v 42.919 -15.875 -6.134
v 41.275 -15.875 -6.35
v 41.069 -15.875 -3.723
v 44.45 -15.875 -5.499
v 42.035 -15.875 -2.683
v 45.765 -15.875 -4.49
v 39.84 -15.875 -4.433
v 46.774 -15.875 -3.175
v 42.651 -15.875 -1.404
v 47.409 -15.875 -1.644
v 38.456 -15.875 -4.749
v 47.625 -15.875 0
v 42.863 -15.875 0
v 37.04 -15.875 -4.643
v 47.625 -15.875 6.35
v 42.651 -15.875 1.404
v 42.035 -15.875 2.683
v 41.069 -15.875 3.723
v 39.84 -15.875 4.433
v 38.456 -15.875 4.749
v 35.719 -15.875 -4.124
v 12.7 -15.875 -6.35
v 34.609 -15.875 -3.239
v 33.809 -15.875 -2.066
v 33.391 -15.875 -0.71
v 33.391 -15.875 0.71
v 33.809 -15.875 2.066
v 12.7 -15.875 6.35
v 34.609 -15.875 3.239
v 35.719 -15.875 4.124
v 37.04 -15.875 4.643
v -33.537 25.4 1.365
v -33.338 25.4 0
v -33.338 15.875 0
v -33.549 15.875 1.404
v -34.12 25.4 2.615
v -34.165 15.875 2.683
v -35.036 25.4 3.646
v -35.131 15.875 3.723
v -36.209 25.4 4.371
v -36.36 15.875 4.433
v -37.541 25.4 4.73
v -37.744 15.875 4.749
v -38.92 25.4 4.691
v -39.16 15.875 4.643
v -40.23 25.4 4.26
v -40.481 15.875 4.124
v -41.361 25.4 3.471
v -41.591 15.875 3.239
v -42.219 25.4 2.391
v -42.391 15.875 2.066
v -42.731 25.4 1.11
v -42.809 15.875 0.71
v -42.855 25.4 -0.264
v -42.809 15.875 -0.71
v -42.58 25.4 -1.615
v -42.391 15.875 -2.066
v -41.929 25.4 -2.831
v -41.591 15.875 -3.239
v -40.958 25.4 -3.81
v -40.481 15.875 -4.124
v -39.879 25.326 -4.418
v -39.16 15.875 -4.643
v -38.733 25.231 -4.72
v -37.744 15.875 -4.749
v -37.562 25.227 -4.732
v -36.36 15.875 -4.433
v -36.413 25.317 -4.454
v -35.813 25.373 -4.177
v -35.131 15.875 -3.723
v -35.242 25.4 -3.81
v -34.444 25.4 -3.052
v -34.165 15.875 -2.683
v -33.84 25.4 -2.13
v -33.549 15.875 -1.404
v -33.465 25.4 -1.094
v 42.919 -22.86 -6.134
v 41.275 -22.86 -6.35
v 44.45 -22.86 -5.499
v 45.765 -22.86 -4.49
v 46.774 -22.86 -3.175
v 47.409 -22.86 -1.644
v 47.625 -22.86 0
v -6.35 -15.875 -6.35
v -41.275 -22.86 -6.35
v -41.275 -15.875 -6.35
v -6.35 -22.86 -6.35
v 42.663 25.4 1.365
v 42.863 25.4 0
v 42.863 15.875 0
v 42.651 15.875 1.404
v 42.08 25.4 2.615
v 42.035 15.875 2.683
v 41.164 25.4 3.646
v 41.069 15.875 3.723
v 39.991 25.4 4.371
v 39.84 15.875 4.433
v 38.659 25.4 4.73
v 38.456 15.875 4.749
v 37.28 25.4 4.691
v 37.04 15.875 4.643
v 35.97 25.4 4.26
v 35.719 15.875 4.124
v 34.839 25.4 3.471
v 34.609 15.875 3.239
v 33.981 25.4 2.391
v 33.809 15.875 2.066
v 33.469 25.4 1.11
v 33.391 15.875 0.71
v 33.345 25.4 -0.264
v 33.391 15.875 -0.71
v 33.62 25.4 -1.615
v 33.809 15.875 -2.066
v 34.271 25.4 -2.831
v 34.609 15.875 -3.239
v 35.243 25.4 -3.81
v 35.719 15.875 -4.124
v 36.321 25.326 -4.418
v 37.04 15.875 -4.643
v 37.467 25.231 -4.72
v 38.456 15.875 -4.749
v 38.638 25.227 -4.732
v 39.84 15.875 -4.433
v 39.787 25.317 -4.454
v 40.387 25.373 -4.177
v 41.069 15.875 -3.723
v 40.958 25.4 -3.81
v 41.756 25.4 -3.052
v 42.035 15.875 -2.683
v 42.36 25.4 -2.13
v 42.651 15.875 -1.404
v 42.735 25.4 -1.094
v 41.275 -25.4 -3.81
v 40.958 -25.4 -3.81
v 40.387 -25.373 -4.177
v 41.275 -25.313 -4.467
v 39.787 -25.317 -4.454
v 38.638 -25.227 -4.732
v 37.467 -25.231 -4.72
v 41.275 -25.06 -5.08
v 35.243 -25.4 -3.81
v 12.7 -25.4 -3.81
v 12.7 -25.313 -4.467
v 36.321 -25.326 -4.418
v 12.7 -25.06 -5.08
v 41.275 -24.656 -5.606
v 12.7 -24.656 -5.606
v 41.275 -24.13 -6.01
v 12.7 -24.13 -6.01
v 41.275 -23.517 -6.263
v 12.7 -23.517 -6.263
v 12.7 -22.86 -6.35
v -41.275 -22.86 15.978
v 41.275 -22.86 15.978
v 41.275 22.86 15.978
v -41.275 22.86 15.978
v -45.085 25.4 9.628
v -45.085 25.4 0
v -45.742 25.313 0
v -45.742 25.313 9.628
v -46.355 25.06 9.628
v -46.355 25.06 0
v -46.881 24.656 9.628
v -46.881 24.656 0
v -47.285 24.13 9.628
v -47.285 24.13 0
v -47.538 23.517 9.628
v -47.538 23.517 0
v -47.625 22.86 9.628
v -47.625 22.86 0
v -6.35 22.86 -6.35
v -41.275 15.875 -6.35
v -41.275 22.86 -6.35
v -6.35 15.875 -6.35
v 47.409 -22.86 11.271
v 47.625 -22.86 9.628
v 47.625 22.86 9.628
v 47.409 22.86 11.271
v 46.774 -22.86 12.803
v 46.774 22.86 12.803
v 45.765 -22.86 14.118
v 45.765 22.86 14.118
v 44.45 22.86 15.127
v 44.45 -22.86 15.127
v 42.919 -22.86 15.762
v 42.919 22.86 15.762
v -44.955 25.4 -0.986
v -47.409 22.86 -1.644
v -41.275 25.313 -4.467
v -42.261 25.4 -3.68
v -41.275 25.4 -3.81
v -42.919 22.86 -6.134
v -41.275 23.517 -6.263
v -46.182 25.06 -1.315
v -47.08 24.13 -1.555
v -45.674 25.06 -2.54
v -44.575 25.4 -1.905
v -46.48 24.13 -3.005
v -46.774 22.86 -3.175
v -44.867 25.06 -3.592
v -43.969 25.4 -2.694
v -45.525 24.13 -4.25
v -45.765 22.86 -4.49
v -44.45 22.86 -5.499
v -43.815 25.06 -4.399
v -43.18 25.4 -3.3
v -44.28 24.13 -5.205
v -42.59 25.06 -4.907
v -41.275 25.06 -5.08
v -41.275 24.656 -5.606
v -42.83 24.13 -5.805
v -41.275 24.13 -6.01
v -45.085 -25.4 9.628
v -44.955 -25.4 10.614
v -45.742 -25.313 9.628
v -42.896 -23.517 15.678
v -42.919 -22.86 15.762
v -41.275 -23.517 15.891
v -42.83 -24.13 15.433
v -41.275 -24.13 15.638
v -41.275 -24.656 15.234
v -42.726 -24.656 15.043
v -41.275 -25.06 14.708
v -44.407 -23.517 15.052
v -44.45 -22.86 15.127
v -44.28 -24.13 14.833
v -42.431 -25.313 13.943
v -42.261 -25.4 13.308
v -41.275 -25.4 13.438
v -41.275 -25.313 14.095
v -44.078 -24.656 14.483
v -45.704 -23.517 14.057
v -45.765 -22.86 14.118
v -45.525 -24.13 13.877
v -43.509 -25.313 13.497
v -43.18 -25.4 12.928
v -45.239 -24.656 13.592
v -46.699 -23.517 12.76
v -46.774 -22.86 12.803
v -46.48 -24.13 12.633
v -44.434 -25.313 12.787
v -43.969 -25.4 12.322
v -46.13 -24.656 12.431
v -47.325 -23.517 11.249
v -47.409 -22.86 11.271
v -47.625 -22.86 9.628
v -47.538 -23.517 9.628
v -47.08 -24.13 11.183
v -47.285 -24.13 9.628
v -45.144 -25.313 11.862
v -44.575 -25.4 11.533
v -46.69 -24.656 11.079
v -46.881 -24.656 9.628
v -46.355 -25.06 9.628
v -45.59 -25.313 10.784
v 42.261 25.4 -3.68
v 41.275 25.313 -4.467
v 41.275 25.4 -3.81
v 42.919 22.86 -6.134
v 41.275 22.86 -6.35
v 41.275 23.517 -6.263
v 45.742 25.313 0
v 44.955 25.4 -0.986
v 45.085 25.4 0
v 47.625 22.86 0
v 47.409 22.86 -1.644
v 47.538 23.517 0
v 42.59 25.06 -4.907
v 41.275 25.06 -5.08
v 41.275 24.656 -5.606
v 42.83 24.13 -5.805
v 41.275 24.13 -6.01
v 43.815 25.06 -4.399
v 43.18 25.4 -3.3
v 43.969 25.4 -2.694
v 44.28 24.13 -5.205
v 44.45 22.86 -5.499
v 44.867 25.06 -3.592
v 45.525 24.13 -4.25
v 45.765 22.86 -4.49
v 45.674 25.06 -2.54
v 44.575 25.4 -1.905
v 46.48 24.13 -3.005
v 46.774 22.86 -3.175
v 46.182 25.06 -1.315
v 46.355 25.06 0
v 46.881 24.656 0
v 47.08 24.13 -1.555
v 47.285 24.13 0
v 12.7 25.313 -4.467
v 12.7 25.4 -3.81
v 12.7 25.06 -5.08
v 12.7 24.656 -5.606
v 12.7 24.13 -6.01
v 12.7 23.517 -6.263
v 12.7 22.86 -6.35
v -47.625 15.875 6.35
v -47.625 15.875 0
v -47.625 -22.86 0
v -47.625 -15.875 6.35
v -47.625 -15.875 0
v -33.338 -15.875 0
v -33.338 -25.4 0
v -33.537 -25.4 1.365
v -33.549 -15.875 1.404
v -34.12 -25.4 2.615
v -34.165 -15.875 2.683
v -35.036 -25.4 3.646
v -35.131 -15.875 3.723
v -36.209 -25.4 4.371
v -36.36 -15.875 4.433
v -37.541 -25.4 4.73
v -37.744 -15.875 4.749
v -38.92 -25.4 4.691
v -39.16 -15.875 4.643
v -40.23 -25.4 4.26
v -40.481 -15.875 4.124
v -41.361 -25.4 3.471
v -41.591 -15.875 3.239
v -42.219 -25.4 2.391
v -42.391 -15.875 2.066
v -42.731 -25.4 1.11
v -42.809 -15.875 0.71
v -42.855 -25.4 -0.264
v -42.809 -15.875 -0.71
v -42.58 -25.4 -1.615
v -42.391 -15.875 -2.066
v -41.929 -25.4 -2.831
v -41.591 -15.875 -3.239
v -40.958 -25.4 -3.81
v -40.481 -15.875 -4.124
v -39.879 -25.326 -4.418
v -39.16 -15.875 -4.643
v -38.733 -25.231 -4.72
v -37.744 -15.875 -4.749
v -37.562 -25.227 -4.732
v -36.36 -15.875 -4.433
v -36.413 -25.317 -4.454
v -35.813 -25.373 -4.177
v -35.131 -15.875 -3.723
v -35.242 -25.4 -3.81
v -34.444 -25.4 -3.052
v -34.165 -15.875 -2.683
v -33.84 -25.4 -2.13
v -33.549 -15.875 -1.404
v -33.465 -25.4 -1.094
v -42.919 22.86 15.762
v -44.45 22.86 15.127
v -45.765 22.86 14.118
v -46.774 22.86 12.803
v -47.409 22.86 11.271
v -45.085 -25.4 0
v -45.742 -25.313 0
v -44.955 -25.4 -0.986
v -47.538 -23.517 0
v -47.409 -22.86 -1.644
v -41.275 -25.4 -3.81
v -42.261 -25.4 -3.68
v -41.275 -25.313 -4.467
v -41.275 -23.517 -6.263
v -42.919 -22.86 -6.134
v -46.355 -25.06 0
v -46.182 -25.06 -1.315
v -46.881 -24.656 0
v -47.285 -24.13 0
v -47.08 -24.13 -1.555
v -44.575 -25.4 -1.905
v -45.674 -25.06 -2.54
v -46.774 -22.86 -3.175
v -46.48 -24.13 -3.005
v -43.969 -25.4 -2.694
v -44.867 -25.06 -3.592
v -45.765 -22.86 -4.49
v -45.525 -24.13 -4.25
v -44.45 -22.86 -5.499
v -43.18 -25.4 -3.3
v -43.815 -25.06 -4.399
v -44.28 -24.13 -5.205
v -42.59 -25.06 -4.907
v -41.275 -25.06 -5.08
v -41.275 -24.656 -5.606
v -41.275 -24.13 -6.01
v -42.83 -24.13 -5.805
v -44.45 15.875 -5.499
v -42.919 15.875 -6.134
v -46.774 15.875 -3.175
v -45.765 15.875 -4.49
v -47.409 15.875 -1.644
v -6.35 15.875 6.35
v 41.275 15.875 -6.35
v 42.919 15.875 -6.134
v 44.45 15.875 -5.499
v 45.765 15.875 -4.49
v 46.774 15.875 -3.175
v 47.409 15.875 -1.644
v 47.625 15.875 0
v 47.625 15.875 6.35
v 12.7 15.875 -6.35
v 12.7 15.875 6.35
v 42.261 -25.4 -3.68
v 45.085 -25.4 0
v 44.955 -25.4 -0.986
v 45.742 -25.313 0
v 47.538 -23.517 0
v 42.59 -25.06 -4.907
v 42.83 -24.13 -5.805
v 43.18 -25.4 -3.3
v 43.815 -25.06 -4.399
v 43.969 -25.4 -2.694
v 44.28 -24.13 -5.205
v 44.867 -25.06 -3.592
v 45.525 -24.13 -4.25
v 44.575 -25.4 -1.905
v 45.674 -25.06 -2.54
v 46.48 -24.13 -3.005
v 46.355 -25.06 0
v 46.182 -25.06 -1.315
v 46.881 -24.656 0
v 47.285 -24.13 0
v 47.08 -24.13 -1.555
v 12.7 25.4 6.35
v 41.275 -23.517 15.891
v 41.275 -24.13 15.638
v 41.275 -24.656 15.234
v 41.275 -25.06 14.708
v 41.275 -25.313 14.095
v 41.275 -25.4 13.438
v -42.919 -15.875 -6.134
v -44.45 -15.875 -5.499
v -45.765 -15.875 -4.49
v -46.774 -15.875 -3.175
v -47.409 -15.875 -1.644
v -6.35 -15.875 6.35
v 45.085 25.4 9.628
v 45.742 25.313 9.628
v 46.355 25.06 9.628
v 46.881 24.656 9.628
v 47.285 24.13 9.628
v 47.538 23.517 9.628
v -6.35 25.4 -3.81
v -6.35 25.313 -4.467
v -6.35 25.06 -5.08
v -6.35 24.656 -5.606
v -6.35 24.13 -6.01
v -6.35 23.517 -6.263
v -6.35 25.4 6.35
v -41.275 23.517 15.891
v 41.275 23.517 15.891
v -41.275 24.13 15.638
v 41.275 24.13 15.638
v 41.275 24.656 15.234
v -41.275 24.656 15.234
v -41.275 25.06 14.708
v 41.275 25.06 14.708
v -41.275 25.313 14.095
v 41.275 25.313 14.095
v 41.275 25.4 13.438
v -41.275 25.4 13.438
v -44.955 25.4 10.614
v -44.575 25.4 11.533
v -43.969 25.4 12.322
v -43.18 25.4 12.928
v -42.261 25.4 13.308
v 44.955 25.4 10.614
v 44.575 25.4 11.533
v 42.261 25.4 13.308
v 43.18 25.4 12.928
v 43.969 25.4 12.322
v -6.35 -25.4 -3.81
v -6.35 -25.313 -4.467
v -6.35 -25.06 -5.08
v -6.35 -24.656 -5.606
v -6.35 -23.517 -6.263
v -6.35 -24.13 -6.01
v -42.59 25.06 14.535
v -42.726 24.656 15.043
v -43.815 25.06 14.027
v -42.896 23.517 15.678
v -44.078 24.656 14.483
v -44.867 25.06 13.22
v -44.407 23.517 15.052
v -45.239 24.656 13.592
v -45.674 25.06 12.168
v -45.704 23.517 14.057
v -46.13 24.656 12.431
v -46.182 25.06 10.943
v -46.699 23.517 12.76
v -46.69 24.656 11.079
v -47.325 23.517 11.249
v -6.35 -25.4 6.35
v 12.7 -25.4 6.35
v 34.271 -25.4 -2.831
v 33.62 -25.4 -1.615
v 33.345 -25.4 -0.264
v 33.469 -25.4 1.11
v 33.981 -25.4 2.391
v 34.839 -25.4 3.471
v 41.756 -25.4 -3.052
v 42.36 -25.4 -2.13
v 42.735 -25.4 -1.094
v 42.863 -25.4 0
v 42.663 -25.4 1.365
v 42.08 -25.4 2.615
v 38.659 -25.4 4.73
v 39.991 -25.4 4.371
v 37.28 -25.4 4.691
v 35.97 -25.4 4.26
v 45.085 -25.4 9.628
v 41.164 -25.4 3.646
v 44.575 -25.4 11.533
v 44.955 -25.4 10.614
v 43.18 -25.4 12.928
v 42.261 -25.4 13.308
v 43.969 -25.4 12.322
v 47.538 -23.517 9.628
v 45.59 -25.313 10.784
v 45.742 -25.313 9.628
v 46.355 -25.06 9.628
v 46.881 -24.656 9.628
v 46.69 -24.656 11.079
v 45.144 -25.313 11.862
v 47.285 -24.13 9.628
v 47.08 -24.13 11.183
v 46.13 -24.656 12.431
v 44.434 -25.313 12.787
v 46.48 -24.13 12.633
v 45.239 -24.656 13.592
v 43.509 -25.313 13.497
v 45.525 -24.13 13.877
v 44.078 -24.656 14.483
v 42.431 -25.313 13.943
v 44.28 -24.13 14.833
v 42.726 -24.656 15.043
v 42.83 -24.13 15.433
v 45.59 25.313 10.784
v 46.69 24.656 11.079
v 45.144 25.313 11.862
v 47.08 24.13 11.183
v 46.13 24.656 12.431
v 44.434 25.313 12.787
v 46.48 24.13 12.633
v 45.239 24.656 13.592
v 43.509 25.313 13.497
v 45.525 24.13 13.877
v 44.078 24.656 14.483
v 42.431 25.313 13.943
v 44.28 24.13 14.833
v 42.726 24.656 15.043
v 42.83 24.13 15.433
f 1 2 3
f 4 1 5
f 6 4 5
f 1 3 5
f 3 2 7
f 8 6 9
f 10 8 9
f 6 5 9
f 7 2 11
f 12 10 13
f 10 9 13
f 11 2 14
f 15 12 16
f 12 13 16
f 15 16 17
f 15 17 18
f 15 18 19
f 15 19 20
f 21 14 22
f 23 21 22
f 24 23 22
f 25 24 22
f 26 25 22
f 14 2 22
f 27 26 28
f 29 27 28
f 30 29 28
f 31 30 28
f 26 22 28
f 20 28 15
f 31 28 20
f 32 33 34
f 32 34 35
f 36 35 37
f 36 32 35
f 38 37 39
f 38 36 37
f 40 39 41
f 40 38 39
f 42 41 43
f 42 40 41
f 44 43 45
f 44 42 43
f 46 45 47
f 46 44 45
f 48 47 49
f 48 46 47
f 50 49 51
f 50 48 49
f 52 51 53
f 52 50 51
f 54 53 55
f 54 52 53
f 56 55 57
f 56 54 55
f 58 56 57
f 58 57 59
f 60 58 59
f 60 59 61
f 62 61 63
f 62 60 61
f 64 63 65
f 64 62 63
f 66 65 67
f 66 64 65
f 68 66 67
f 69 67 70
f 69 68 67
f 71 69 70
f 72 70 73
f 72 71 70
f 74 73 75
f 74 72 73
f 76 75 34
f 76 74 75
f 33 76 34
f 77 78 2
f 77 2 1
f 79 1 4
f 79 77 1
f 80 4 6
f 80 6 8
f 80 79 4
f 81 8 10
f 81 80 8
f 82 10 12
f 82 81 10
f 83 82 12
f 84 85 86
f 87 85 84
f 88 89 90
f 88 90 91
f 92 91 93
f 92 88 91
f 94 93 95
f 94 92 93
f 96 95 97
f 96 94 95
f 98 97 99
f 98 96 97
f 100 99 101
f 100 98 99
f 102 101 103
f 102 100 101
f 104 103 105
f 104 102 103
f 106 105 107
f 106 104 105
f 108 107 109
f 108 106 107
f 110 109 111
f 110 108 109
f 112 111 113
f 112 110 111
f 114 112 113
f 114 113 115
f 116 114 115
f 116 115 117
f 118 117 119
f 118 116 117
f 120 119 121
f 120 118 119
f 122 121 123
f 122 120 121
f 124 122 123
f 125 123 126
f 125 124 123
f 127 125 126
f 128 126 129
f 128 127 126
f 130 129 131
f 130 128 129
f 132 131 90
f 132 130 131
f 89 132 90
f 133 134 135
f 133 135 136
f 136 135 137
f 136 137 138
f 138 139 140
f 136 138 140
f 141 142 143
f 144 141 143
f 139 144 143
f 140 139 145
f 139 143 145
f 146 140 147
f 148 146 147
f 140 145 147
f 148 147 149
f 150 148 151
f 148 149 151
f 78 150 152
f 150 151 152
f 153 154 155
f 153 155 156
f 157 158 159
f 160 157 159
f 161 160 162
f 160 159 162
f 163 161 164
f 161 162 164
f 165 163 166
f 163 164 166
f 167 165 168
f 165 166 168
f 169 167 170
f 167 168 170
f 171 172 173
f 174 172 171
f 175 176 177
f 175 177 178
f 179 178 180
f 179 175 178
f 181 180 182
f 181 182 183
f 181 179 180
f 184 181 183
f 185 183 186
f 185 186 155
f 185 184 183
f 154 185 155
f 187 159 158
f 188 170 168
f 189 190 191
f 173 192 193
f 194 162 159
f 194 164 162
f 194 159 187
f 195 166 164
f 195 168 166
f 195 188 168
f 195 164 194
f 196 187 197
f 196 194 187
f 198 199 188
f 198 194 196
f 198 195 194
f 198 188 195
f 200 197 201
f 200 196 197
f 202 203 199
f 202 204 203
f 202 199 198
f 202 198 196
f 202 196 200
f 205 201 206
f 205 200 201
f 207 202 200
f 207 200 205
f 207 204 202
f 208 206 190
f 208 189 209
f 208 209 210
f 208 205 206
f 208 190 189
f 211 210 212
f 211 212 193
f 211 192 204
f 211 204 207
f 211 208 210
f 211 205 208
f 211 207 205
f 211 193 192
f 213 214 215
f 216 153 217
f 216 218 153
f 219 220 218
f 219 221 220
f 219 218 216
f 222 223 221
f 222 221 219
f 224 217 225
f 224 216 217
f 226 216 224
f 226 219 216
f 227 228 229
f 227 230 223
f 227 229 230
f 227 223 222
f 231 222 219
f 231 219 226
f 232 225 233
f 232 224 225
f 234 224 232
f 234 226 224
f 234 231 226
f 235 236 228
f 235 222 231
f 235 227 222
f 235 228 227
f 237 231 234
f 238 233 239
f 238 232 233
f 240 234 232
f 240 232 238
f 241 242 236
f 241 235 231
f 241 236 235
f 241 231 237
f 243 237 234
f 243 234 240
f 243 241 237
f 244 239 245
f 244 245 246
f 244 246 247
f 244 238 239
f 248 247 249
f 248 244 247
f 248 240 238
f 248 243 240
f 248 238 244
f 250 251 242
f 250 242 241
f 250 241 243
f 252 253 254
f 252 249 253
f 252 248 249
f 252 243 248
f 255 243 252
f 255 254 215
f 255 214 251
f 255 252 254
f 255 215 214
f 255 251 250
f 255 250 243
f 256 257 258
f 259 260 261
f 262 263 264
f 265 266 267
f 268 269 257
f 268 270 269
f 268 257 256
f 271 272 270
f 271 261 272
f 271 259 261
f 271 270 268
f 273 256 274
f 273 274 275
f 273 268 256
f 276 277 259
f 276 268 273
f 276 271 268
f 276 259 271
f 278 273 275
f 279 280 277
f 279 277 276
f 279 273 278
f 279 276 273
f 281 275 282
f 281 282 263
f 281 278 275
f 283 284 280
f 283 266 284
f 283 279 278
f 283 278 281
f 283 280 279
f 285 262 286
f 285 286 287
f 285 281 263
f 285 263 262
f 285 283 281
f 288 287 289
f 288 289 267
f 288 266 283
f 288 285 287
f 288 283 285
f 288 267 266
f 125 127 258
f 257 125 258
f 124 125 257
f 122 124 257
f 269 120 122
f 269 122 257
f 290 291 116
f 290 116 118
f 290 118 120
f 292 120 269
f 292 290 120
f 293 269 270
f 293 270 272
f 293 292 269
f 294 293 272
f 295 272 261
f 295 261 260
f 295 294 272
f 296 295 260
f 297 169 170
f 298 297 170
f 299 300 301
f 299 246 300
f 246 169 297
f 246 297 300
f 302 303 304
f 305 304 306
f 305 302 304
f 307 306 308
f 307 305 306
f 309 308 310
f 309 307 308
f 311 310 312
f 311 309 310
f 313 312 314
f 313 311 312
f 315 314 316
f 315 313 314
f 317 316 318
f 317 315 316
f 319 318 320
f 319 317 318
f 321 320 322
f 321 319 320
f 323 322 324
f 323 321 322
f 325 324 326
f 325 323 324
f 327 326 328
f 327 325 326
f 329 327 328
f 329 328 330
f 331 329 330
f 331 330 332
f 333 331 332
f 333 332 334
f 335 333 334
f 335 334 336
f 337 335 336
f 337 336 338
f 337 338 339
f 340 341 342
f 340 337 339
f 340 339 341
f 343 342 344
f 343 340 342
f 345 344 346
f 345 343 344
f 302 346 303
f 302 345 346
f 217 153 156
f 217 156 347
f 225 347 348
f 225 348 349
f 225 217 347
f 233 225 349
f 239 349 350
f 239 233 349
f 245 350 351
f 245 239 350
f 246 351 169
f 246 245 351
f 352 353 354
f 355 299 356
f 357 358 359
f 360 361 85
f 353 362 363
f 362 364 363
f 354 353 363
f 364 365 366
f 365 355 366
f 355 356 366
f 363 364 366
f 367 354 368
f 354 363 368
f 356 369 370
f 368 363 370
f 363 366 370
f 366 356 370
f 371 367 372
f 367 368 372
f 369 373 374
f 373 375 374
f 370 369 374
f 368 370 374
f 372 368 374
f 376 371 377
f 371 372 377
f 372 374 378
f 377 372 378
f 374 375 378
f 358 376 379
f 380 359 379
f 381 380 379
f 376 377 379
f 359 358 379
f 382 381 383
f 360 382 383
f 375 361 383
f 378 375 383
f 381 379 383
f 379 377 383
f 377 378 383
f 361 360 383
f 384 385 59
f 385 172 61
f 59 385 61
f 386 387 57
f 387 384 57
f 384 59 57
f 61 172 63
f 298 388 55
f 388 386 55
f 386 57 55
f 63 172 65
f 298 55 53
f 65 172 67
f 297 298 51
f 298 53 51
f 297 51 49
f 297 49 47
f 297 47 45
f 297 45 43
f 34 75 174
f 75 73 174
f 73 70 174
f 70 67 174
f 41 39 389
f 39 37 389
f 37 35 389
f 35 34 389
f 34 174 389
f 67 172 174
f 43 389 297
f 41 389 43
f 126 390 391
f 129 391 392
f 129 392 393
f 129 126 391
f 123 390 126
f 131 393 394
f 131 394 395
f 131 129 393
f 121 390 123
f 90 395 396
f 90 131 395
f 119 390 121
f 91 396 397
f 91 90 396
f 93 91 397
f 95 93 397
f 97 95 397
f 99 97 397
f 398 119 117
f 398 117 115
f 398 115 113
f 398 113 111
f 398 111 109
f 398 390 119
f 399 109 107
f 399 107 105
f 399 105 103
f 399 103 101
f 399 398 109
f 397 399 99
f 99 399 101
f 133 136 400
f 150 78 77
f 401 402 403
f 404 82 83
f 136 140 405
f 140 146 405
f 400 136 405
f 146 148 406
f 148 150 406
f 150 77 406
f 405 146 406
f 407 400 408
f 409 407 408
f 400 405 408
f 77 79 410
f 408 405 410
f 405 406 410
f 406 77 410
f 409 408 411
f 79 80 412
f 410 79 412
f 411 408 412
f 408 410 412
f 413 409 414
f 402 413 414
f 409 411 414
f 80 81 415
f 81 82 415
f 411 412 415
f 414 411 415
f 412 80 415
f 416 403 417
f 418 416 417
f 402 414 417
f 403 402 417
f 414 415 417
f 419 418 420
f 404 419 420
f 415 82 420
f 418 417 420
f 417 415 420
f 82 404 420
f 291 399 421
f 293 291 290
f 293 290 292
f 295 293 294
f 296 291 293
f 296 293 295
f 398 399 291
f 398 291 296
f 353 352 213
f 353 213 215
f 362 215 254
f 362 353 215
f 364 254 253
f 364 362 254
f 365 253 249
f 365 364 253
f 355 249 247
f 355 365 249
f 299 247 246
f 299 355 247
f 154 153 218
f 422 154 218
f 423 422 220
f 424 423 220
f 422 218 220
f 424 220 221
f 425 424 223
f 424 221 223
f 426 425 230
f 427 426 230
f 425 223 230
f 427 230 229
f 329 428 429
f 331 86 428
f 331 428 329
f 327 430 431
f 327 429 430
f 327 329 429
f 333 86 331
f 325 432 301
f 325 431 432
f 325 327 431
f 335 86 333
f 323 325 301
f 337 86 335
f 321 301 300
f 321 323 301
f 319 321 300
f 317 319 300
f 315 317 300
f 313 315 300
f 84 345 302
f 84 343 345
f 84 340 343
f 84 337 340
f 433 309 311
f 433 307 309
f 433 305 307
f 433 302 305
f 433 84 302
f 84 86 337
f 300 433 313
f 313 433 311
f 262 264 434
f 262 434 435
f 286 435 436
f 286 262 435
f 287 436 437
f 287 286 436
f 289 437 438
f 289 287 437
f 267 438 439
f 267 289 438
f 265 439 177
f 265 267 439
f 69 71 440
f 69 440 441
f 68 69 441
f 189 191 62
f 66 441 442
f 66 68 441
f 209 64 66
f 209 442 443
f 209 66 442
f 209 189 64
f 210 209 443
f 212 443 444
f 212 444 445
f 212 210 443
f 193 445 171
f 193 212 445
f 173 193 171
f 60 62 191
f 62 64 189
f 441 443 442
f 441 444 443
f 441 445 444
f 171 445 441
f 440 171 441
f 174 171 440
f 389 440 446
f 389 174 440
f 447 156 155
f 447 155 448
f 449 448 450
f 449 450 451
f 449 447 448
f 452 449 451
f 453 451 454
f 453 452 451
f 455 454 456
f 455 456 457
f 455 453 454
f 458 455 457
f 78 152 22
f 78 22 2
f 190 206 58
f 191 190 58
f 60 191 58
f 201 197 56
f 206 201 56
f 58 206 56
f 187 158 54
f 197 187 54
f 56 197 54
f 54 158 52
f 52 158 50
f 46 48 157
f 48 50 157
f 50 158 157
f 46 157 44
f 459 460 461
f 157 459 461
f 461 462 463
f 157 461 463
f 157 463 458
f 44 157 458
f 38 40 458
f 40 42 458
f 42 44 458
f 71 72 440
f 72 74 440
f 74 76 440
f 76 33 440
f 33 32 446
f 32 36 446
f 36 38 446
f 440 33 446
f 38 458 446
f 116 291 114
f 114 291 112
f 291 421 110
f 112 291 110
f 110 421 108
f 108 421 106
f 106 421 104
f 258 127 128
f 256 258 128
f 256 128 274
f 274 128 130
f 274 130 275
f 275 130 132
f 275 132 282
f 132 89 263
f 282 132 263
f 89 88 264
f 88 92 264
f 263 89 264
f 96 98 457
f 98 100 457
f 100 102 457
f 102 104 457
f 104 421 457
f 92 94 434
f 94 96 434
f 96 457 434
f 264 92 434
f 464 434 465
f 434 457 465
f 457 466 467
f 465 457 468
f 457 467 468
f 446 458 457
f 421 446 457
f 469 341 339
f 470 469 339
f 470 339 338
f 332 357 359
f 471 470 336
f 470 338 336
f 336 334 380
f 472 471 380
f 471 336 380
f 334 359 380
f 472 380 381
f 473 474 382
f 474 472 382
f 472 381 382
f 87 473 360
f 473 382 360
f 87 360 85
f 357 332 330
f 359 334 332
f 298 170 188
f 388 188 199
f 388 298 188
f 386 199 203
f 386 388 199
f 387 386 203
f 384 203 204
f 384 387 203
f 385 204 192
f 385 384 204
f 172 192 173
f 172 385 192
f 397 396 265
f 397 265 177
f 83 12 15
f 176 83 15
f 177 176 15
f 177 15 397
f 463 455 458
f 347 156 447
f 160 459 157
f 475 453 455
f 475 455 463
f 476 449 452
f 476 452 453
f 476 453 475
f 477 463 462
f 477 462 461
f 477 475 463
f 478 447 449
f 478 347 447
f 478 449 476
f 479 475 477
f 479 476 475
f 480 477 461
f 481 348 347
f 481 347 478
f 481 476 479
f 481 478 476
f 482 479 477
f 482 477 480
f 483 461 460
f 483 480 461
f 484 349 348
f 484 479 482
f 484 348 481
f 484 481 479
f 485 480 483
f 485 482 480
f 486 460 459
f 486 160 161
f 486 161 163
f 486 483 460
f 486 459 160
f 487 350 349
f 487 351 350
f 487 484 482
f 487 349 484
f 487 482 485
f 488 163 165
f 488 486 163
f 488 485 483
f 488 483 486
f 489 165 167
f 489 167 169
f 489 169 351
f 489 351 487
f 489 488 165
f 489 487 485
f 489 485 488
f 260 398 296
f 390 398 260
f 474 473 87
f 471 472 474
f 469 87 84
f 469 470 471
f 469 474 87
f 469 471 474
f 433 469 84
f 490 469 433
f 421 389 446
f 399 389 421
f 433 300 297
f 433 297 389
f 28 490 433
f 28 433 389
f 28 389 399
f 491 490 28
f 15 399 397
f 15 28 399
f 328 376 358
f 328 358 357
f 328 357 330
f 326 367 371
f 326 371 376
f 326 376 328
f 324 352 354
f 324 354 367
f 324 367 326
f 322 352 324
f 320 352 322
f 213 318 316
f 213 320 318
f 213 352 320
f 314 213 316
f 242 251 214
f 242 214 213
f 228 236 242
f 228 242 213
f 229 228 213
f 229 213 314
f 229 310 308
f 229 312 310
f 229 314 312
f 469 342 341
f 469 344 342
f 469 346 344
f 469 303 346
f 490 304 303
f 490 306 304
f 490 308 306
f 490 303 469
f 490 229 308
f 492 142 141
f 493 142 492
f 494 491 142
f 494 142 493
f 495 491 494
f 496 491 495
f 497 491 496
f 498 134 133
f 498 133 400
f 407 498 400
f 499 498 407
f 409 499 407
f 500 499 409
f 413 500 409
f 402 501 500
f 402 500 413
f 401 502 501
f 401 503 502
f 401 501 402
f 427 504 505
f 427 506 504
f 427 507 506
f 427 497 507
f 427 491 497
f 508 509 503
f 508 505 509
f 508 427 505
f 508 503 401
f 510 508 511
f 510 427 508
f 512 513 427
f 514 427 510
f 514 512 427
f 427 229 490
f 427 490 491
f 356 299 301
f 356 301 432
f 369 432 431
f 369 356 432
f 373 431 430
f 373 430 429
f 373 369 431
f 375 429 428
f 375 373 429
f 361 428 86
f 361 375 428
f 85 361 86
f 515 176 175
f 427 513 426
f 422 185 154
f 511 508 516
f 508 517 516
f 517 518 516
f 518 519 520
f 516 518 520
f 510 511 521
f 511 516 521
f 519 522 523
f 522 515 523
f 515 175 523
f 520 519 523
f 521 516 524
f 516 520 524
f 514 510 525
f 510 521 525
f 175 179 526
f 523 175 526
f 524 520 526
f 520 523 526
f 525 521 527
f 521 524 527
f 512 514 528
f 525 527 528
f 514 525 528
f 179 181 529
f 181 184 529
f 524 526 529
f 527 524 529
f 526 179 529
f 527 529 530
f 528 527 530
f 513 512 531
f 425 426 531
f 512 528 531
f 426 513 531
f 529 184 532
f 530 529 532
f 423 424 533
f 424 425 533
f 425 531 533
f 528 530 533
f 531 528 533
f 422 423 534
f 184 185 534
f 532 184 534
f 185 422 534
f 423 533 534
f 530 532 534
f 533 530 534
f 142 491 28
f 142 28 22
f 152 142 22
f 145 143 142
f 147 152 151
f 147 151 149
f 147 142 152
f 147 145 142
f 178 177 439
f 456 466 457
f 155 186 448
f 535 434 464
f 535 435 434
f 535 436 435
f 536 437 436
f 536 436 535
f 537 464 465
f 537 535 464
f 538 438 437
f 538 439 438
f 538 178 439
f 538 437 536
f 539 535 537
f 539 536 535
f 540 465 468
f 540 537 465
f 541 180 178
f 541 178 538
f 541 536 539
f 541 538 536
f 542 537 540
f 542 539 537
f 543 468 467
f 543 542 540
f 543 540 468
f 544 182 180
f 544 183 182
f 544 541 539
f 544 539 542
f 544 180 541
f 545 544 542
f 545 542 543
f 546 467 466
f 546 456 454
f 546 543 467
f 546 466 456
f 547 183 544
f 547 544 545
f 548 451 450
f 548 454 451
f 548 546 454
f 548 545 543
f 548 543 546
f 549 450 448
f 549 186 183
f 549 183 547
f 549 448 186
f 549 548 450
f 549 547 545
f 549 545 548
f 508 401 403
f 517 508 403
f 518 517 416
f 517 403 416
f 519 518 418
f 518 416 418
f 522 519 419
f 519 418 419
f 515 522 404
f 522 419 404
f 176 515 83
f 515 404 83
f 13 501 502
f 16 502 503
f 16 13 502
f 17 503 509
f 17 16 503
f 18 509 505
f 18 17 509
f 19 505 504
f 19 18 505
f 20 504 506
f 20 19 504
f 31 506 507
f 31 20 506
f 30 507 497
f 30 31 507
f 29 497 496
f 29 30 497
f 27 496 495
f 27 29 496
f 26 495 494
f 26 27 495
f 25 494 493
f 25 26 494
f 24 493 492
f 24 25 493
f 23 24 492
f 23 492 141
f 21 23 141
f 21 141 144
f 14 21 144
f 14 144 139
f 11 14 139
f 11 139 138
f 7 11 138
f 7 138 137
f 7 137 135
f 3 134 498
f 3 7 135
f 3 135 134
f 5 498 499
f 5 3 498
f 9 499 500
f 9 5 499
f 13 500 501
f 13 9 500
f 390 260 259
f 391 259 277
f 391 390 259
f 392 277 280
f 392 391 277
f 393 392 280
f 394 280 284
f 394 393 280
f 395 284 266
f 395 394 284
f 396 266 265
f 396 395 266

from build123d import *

# Parameters (mm, degrees)
F0_R          = 4.7625
F1_DEPTH      = 25.4
F2_W          = 31.75
F2_H          = 12.7
F3_DEPTH      = 47.626
F3_DEPTH_BACK = 47.626
F4_T1_DEPTH   = 82.55
F4_T3_DEPTH   = 9.6279704779
F4_T5_DEPTH   = 41.275
F4_T7_DEPTH   = 34.925
F4_T10_ANGLE  = 90
F4_T12_ANGLE  = 90
F4_T14_ANGLE  = 90
F4_T16_ANGLE  = 90
F4_T18_ANGLE  = 90
F4_T20_ANGLE  = 90
F4_T22_ANGLE  = 90
F4_T24_ANGLE  = 90


# Not quite as in the source:
# - a fillet or chamfer that OpenCascade refuses, or shapes differently, is made with other operations: its cross-section is extruded or revolved along the edge and cut away or added


with BuildPart() as f1:
    # F0 (on Front) → F1 (new body, symmetric)
    with BuildSketch(Plane.XZ):
        with BuildLine():
            Line((41.275, 15.9779704779), (-41.275, 15.9779704779))
            ThreePointArc((-41.275, 15.9779704779), (-45.7651280605, 14.1180985385), (-47.625, 9.6279704779))
            Line((-47.625, 9.6279704779), (-47.625, 0))
            ThreePointArc((-47.625, 0), (-45.7651280605, -4.4901280605), (-41.275, -6.35))
            Line((-41.275, -6.35), (-6.35, -6.35))
            Line((-6.35, -6.35), (-6.35, 6.35))
            Line((-6.35, 6.35), (12.7, 6.35))
            Line((12.7, 6.35), (12.7, -6.35))
            Line((12.7, -6.35), (41.275, -6.35))
            ThreePointArc((41.275, -6.35), (45.7651280605, -4.4901280605), (47.625, 0))
            Line((47.625, 0), (47.625, 9.6279704779))
            ThreePointArc((47.625, 9.6279704779), (45.7651280605, 14.1180985385), (41.275, 15.9779704779))
        make_face()
        with Locations((-38.1, 0)):
            Circle(F0_R, mode=Mode.SUBTRACT)
        with Locations((38.1, 0)):
            Circle(F0_R, mode=Mode.SUBTRACT)
    extrude(amount=F1_DEPTH, both=True)

    # F2 (on Right) → F3 (cut, two sides)
    with BuildSketch(Plane.YZ) as f3_sk:
        Rectangle(F2_W, F2_H)
    extrude(amount=F3_DEPTH, mode=Mode.SUBTRACT)
    extrude(f3_sk.sketch, amount=-F3_DEPTH_BACK, mode=Mode.SUBTRACT)

    # F4: fillet of radius 2.54 on 18 edges, made by hand

    # F4_s2 → F4_t1 (cut)
    with BuildSketch(Plane.YZ.offset(-41.275)):
        with BuildLine():
            ThreePointArc((22.86, 15.9779704779), (24.6560512242, 15.2340217022), (25.4, 13.4379704779))
            Line((25.4, 13.4379704779), (25.4, 15.9779704779))
            Line((25.4, 15.9779704779), (22.86, 15.9779704779))
        make_face()
        with BuildLine():
            ThreePointArc((-22.86, 15.9779704779), (-24.6560512242, 15.2340217022), (-25.4, 13.4379704779))
            Line((-25.4, 13.4379704779), (-25.4, 15.9779704779))
            Line((-25.4, 15.9779704779), (-22.86, 15.9779704779))
        make_face()
    extrude(amount=F4_T1_DEPTH, mode=Mode.SUBTRACT)

    # F4_s4 → F4_t3 (cut)
    with BuildSketch(Plane.XY):
        with BuildLine():
            ThreePointArc((-45.085, 25.4), (-46.8810512242, 24.6560512242), (-47.625, 22.86))
            Line((-47.625, 22.86), (-47.625, 25.4))
            Line((-47.625, 25.4), (-45.085, 25.4))
        make_face()
        with BuildLine():
            ThreePointArc((45.085, 25.4), (46.8810512242, 24.6560512242), (47.625, 22.86))
            Line((47.625, 22.86), (47.625, 25.4))
            Line((47.625, 25.4), (45.085, 25.4))
        make_face()
        with BuildLine():
            ThreePointArc((-45.085, -25.4), (-46.8810512242, -24.6560512242), (-47.625, -22.86))
            Line((-47.625, -22.86), (-47.625, -25.4))
            Line((-47.625, -25.4), (-45.085, -25.4))
        make_face()
        with BuildLine():
            ThreePointArc((45.085, -25.4), (46.8810512242, -24.6560512242), (47.625, -22.86))
            Line((47.625, -22.86), (47.625, -25.4))
            Line((47.625, -25.4), (45.085, -25.4))
        make_face()
    extrude(amount=F4_T3_DEPTH, mode=Mode.SUBTRACT)

    # F4_s6 → F4_t5 (cut)
    with BuildSketch(Plane.YZ.offset(-41.275)):
        with BuildLine():
            ThreePointArc((25.4, -3.81), (24.6560512242, -5.6060512242), (22.86, -6.35))
            Line((22.86, -6.35), (25.4, -6.35))
            Line((25.4, -6.35), (25.4, -3.81))
        make_face()
        with BuildLine():
            ThreePointArc((-25.4, -3.81), (-24.6560512242, -5.6060512242), (-22.86, -6.35))
            Line((-22.86, -6.35), (-25.4, -6.35))
            Line((-25.4, -6.35), (-25.4, -3.81))
        make_face()
    extrude(amount=F4_T5_DEPTH, mode=Mode.SUBTRACT)

    # F4_s8 → F4_t7 (cut)
    with BuildSketch(Plane.YZ.offset(6.35)):
        with BuildLine():
            ThreePointArc((25.4, -3.81), (24.6560512242, -5.6060512242), (22.86, -6.35))
            Line((22.86, -6.35), (25.4, -6.35))
            Line((25.4, -6.35), (25.4, -3.81))
        make_face()
        with BuildLine():
            ThreePointArc((-25.4, -3.81), (-24.6560512242, -5.6060512242), (-22.86, -6.35))
            Line((-22.86, -6.35), (-25.4, -6.35))
            Line((-25.4, -6.35), (-25.4, -3.81))
        make_face()
    extrude(amount=F4_T7_DEPTH, mode=Mode.SUBTRACT)

    # F4_s9 → F4_t10 (revolve, cut)
    with BuildSketch(Plane.YZ.offset(-41.275)):
        with BuildLine():
            ThreePointArc((25.4, 13.4379704779), (24.6560512242, 15.2340217022), (22.86, 15.9779704779))
            Line((22.86, 15.9779704779), (25.4, 15.9779704779))
            Line((25.4, 15.9779704779), (25.4, 13.4379704779))
        make_face()
    revolve(axis=Axis((-41.275, 25.4, 9.6279704779), (0, -1, 0)), revolution_arc=F4_T10_ANGLE, mode=Mode.SUBTRACT)

    # F4_s11 → F4_t12 (revolve, cut)
    with BuildSketch(Plane.XY):
        with BuildLine():
            ThreePointArc((-45.085, 25.4), (-46.8810512242, 24.6560512242), (-47.625, 22.86))
            Line((-47.625, 22.86), (-47.625, 25.4))
            Line((-47.625, 25.4), (-45.085, 25.4))
        make_face()
    revolve(axis=Axis((-41.275, 25.4, 0), (0, -1, 0)), revolution_arc=F4_T12_ANGLE, mode=Mode.SUBTRACT)

    # F4_s13 → F4_t14 (revolve, cut)
    with BuildSketch(Plane.YZ.offset(41.275)):
        with BuildLine():
            ThreePointArc((25.4, -3.81), (24.6560512242, -5.6060512242), (22.86, -6.35))
            Line((22.86, -6.35), (25.4, -6.35))
            Line((25.4, -6.35), (25.4, -3.81))
        make_face()
    revolve(axis=Axis((41.275, 25.4, 0), (0, -1, 0)), revolution_arc=F4_T14_ANGLE, mode=Mode.SUBTRACT)

    # F4_s15 → F4_t16 (revolve, cut)
    with BuildSketch(Plane.XY.offset(9.6279704779)):
        with BuildLine():
            ThreePointArc((45.085, 25.4), (46.8810512242, 24.6560512242), (47.625, 22.86))
            Line((47.625, 22.86), (47.625, 25.4))
            Line((47.625, 25.4), (45.085, 25.4))
        make_face()
    revolve(axis=Axis((41.275, 25.4, 9.6279704779), (0, -1, 0)), revolution_arc=F4_T16_ANGLE, mode=Mode.SUBTRACT)

    # F4_s17 → F4_t18 (revolve, cut)
    with BuildSketch(Plane.YZ.offset(-41.275)):
        with BuildLine():
            ThreePointArc((-22.86, 15.9779704779), (-24.6560512242, 15.2340217022), (-25.4, 13.4379704779))
            Line((-25.4, 13.4379704779), (-25.4, 15.9779704779))
            Line((-25.4, 15.9779704779), (-22.86, 15.9779704779))
        make_face()
    revolve(axis=Axis((-41.275, -25.4, 9.6279704779), (0, -1, 0)), revolution_arc=F4_T18_ANGLE, mode=Mode.SUBTRACT)

    # F4_s19 → F4_t20 (revolve, cut)
    with BuildSketch(Plane.XY):
        with BuildLine():
            ThreePointArc((-45.085, -25.4), (-46.8810512242, -24.6560512242), (-47.625, -22.86))
            Line((-47.625, -22.86), (-47.625, -25.4))
            Line((-47.625, -25.4), (-45.085, -25.4))
        make_face()
    revolve(axis=Axis((-41.275, -25.4, 0), (0, -1, 0)), revolution_arc=F4_T20_ANGLE, mode=Mode.SUBTRACT)

    # F4_s21 → F4_t22 (revolve, cut)
    with BuildSketch(Plane.YZ.offset(41.275)):
        with BuildLine():
            ThreePointArc((-25.4, -3.81), (-24.6560512242, -5.6060512242), (-22.86, -6.35))
            Line((-22.86, -6.35), (-25.4, -6.35))
            Line((-25.4, -6.35), (-25.4, -3.81))
        make_face()
    revolve(axis=Axis((41.275, -25.4, 0), (0, -1, 0)), revolution_arc=F4_T22_ANGLE, mode=Mode.SUBTRACT)

    # F4_s23 → F4_t24 (revolve, cut)
    with BuildSketch(Plane.XY.offset(9.6279704779)):
        with BuildLine():
            ThreePointArc((45.085, -25.4), (46.8810512242, -24.6560512242), (47.625, -22.86))
            Line((47.625, -22.86), (47.625, -25.4))
            Line((47.625, -25.4), (45.085, -25.4))
        make_face()
    revolve(axis=Axis((41.275, -25.4, 9.6279704779), (0, -1, 0)), revolution_arc=F4_T24_ANGLE, mode=Mode.SUBTRACT)


solid = f1.part
